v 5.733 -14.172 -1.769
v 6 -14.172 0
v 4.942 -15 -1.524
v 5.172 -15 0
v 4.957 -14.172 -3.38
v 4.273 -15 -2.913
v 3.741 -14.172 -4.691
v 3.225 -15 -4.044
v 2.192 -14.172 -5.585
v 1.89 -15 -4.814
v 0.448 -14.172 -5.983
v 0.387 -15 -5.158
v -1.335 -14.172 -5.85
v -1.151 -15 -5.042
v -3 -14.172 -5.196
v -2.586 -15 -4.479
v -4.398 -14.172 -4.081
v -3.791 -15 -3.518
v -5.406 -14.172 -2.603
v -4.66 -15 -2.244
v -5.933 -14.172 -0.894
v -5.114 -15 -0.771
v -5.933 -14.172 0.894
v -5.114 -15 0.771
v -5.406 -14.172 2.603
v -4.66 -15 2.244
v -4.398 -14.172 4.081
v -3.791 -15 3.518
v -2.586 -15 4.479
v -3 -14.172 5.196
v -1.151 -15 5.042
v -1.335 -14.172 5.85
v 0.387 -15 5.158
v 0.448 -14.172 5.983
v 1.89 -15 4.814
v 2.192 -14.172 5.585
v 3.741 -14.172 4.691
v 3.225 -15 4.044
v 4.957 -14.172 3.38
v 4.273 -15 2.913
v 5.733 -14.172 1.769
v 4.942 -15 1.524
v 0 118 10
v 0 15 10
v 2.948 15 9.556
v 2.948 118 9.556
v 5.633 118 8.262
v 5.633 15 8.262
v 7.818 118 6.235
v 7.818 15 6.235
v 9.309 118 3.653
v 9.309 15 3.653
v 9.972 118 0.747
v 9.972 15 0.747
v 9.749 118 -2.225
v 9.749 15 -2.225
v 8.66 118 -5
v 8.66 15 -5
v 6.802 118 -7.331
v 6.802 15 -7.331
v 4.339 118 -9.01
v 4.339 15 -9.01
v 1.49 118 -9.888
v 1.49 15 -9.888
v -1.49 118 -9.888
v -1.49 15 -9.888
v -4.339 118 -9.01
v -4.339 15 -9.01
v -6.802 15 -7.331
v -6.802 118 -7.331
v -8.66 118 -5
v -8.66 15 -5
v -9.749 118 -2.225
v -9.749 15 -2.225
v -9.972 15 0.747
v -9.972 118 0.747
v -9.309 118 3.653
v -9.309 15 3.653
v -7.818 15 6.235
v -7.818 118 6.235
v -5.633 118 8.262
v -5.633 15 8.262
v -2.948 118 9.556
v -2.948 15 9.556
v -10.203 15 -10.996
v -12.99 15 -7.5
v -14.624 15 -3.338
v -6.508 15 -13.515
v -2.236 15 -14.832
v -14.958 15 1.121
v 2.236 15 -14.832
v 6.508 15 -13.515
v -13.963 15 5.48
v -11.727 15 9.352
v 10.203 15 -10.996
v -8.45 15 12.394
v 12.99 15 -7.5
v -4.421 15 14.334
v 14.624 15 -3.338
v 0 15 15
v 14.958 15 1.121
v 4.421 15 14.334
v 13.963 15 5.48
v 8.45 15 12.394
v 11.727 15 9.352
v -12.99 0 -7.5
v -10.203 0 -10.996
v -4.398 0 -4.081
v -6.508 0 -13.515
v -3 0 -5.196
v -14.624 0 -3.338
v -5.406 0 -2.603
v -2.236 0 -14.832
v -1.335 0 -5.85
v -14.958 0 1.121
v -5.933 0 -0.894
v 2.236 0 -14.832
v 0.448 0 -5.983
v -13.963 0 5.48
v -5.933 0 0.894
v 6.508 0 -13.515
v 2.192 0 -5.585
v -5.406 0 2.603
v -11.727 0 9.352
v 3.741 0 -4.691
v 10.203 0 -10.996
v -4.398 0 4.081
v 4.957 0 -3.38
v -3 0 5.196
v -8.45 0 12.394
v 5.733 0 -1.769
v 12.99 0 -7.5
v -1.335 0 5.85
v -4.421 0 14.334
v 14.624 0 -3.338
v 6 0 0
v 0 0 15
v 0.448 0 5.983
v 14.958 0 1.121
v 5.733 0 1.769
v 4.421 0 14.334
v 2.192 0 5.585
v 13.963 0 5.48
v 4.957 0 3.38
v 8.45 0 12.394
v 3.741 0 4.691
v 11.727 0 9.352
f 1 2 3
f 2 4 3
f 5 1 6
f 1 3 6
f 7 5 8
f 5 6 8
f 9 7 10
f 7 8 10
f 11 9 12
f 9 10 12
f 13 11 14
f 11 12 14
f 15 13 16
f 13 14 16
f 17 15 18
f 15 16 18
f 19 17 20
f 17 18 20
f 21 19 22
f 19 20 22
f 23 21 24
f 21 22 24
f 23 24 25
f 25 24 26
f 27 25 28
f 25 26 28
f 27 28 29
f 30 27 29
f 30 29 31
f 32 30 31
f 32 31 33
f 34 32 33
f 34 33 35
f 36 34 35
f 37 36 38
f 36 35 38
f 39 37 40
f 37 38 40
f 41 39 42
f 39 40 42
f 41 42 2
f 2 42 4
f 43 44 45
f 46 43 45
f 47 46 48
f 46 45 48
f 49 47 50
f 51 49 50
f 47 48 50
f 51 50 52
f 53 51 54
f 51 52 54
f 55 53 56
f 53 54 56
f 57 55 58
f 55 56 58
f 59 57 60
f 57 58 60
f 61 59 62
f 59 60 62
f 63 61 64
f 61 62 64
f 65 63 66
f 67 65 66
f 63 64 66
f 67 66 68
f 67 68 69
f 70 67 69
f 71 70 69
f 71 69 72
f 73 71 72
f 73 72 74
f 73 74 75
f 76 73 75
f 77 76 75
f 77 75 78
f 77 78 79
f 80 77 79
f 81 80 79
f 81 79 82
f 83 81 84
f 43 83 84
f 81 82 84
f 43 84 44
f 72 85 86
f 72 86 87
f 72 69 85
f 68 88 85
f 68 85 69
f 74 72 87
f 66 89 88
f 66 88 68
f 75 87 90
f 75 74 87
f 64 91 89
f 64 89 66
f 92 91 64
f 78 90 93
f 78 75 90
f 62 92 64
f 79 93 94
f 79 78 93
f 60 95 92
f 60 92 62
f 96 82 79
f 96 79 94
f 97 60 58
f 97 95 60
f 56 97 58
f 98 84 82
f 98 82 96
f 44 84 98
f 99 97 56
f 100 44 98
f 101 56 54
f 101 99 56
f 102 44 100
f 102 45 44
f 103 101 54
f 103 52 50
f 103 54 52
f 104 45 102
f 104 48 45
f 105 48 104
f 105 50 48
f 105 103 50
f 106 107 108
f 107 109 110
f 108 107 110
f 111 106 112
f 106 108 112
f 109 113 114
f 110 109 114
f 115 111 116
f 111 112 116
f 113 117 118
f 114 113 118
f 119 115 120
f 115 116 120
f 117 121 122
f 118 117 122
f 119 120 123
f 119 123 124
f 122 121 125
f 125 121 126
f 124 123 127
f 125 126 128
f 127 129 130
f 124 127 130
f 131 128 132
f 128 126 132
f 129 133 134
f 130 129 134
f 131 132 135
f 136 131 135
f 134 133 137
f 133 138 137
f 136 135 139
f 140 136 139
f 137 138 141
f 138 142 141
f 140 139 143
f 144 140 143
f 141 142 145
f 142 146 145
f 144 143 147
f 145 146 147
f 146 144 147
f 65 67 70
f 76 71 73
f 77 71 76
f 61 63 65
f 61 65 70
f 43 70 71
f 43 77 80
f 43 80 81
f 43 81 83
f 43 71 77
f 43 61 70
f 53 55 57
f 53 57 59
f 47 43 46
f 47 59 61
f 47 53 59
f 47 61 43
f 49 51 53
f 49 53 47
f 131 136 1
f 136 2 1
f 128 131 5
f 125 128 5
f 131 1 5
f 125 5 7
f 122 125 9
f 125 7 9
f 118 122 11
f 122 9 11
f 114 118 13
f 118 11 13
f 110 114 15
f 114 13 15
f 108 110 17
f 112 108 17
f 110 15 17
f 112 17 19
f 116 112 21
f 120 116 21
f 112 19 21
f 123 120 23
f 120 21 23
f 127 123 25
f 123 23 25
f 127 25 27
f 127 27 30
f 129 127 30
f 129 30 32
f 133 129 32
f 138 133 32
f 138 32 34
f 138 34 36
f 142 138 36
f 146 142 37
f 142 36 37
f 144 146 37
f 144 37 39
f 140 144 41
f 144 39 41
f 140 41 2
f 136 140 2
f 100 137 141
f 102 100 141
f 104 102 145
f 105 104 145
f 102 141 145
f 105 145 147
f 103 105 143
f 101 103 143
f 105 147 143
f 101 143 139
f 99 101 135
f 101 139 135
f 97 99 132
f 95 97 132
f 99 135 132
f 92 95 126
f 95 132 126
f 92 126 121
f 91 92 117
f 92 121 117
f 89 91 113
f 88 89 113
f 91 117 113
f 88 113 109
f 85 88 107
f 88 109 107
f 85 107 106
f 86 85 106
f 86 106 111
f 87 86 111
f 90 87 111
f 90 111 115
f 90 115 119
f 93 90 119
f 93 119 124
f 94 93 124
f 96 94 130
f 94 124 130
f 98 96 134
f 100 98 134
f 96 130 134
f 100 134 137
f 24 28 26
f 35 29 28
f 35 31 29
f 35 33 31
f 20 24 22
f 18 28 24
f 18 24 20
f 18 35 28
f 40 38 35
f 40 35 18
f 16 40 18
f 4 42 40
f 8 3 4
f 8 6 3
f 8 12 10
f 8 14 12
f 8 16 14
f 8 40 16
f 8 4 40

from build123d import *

# Parameters (mm, degrees)
SKETCH1_R           = 15
BOSS_EXTRUDE1_DEPTH = 15
SKETCH2_R           = 10
BOSS_EXTRUDE2_DEPTH = 103
SKETCH3_R           = 7.5
BOSS_EXTRUDE3_DEPTH = 15


# Read off the part's stored shape, not the designer's step: M12x1.5 Machine Threads Stud1
with BuildPart() as part:
    # Sketch1 → Boss-Extrude1 (new body)
    with BuildSketch(Plane(origin=(0, 0, 0), x_dir=(1, 0, 0), z_dir=(0, 1, 0))):
        with Locations(Location((0, 0, 0), (0, 0, 270))):
            Circle(SKETCH1_R)
    extrude(amount=BOSS_EXTRUDE1_DEPTH)

    # Sketch2 → Boss-Extrude2 (add)
    with BuildSketch(Plane(origin=(0, 15, 0), x_dir=(1, 0, 0), z_dir=(0, 1, 0))):
        with Locations(Location((0, 0, 0), (0, 0, 270))):
            Circle(SKETCH2_R)
    extrude(amount=BOSS_EXTRUDE2_DEPTH)

    # Sketch3 → Boss-Extrude3 (add)
    with BuildSketch(Plane.XZ):
        with Locations(Location((0, 0, 0), (0, 0, 270))):
            Circle(SKETCH3_R)
    extrude(amount=BOSS_EXTRUDE3_DEPTH)

    # M12x1.5 Machine Threads Stud1 outline → M12x1.5 Machine Threads Stud1 (revolve, cut)
    with BuildSketch(Plane.XY):
        Polygon((7.5, 0), (6, 0), (6, -14.172), (5.172, -15), (7.5, -15), align=None)
    revolve(axis=Axis((0, 0, 0), (0, 1, 0)), mode=Mode.SUBTRACT)


solid = part.part
